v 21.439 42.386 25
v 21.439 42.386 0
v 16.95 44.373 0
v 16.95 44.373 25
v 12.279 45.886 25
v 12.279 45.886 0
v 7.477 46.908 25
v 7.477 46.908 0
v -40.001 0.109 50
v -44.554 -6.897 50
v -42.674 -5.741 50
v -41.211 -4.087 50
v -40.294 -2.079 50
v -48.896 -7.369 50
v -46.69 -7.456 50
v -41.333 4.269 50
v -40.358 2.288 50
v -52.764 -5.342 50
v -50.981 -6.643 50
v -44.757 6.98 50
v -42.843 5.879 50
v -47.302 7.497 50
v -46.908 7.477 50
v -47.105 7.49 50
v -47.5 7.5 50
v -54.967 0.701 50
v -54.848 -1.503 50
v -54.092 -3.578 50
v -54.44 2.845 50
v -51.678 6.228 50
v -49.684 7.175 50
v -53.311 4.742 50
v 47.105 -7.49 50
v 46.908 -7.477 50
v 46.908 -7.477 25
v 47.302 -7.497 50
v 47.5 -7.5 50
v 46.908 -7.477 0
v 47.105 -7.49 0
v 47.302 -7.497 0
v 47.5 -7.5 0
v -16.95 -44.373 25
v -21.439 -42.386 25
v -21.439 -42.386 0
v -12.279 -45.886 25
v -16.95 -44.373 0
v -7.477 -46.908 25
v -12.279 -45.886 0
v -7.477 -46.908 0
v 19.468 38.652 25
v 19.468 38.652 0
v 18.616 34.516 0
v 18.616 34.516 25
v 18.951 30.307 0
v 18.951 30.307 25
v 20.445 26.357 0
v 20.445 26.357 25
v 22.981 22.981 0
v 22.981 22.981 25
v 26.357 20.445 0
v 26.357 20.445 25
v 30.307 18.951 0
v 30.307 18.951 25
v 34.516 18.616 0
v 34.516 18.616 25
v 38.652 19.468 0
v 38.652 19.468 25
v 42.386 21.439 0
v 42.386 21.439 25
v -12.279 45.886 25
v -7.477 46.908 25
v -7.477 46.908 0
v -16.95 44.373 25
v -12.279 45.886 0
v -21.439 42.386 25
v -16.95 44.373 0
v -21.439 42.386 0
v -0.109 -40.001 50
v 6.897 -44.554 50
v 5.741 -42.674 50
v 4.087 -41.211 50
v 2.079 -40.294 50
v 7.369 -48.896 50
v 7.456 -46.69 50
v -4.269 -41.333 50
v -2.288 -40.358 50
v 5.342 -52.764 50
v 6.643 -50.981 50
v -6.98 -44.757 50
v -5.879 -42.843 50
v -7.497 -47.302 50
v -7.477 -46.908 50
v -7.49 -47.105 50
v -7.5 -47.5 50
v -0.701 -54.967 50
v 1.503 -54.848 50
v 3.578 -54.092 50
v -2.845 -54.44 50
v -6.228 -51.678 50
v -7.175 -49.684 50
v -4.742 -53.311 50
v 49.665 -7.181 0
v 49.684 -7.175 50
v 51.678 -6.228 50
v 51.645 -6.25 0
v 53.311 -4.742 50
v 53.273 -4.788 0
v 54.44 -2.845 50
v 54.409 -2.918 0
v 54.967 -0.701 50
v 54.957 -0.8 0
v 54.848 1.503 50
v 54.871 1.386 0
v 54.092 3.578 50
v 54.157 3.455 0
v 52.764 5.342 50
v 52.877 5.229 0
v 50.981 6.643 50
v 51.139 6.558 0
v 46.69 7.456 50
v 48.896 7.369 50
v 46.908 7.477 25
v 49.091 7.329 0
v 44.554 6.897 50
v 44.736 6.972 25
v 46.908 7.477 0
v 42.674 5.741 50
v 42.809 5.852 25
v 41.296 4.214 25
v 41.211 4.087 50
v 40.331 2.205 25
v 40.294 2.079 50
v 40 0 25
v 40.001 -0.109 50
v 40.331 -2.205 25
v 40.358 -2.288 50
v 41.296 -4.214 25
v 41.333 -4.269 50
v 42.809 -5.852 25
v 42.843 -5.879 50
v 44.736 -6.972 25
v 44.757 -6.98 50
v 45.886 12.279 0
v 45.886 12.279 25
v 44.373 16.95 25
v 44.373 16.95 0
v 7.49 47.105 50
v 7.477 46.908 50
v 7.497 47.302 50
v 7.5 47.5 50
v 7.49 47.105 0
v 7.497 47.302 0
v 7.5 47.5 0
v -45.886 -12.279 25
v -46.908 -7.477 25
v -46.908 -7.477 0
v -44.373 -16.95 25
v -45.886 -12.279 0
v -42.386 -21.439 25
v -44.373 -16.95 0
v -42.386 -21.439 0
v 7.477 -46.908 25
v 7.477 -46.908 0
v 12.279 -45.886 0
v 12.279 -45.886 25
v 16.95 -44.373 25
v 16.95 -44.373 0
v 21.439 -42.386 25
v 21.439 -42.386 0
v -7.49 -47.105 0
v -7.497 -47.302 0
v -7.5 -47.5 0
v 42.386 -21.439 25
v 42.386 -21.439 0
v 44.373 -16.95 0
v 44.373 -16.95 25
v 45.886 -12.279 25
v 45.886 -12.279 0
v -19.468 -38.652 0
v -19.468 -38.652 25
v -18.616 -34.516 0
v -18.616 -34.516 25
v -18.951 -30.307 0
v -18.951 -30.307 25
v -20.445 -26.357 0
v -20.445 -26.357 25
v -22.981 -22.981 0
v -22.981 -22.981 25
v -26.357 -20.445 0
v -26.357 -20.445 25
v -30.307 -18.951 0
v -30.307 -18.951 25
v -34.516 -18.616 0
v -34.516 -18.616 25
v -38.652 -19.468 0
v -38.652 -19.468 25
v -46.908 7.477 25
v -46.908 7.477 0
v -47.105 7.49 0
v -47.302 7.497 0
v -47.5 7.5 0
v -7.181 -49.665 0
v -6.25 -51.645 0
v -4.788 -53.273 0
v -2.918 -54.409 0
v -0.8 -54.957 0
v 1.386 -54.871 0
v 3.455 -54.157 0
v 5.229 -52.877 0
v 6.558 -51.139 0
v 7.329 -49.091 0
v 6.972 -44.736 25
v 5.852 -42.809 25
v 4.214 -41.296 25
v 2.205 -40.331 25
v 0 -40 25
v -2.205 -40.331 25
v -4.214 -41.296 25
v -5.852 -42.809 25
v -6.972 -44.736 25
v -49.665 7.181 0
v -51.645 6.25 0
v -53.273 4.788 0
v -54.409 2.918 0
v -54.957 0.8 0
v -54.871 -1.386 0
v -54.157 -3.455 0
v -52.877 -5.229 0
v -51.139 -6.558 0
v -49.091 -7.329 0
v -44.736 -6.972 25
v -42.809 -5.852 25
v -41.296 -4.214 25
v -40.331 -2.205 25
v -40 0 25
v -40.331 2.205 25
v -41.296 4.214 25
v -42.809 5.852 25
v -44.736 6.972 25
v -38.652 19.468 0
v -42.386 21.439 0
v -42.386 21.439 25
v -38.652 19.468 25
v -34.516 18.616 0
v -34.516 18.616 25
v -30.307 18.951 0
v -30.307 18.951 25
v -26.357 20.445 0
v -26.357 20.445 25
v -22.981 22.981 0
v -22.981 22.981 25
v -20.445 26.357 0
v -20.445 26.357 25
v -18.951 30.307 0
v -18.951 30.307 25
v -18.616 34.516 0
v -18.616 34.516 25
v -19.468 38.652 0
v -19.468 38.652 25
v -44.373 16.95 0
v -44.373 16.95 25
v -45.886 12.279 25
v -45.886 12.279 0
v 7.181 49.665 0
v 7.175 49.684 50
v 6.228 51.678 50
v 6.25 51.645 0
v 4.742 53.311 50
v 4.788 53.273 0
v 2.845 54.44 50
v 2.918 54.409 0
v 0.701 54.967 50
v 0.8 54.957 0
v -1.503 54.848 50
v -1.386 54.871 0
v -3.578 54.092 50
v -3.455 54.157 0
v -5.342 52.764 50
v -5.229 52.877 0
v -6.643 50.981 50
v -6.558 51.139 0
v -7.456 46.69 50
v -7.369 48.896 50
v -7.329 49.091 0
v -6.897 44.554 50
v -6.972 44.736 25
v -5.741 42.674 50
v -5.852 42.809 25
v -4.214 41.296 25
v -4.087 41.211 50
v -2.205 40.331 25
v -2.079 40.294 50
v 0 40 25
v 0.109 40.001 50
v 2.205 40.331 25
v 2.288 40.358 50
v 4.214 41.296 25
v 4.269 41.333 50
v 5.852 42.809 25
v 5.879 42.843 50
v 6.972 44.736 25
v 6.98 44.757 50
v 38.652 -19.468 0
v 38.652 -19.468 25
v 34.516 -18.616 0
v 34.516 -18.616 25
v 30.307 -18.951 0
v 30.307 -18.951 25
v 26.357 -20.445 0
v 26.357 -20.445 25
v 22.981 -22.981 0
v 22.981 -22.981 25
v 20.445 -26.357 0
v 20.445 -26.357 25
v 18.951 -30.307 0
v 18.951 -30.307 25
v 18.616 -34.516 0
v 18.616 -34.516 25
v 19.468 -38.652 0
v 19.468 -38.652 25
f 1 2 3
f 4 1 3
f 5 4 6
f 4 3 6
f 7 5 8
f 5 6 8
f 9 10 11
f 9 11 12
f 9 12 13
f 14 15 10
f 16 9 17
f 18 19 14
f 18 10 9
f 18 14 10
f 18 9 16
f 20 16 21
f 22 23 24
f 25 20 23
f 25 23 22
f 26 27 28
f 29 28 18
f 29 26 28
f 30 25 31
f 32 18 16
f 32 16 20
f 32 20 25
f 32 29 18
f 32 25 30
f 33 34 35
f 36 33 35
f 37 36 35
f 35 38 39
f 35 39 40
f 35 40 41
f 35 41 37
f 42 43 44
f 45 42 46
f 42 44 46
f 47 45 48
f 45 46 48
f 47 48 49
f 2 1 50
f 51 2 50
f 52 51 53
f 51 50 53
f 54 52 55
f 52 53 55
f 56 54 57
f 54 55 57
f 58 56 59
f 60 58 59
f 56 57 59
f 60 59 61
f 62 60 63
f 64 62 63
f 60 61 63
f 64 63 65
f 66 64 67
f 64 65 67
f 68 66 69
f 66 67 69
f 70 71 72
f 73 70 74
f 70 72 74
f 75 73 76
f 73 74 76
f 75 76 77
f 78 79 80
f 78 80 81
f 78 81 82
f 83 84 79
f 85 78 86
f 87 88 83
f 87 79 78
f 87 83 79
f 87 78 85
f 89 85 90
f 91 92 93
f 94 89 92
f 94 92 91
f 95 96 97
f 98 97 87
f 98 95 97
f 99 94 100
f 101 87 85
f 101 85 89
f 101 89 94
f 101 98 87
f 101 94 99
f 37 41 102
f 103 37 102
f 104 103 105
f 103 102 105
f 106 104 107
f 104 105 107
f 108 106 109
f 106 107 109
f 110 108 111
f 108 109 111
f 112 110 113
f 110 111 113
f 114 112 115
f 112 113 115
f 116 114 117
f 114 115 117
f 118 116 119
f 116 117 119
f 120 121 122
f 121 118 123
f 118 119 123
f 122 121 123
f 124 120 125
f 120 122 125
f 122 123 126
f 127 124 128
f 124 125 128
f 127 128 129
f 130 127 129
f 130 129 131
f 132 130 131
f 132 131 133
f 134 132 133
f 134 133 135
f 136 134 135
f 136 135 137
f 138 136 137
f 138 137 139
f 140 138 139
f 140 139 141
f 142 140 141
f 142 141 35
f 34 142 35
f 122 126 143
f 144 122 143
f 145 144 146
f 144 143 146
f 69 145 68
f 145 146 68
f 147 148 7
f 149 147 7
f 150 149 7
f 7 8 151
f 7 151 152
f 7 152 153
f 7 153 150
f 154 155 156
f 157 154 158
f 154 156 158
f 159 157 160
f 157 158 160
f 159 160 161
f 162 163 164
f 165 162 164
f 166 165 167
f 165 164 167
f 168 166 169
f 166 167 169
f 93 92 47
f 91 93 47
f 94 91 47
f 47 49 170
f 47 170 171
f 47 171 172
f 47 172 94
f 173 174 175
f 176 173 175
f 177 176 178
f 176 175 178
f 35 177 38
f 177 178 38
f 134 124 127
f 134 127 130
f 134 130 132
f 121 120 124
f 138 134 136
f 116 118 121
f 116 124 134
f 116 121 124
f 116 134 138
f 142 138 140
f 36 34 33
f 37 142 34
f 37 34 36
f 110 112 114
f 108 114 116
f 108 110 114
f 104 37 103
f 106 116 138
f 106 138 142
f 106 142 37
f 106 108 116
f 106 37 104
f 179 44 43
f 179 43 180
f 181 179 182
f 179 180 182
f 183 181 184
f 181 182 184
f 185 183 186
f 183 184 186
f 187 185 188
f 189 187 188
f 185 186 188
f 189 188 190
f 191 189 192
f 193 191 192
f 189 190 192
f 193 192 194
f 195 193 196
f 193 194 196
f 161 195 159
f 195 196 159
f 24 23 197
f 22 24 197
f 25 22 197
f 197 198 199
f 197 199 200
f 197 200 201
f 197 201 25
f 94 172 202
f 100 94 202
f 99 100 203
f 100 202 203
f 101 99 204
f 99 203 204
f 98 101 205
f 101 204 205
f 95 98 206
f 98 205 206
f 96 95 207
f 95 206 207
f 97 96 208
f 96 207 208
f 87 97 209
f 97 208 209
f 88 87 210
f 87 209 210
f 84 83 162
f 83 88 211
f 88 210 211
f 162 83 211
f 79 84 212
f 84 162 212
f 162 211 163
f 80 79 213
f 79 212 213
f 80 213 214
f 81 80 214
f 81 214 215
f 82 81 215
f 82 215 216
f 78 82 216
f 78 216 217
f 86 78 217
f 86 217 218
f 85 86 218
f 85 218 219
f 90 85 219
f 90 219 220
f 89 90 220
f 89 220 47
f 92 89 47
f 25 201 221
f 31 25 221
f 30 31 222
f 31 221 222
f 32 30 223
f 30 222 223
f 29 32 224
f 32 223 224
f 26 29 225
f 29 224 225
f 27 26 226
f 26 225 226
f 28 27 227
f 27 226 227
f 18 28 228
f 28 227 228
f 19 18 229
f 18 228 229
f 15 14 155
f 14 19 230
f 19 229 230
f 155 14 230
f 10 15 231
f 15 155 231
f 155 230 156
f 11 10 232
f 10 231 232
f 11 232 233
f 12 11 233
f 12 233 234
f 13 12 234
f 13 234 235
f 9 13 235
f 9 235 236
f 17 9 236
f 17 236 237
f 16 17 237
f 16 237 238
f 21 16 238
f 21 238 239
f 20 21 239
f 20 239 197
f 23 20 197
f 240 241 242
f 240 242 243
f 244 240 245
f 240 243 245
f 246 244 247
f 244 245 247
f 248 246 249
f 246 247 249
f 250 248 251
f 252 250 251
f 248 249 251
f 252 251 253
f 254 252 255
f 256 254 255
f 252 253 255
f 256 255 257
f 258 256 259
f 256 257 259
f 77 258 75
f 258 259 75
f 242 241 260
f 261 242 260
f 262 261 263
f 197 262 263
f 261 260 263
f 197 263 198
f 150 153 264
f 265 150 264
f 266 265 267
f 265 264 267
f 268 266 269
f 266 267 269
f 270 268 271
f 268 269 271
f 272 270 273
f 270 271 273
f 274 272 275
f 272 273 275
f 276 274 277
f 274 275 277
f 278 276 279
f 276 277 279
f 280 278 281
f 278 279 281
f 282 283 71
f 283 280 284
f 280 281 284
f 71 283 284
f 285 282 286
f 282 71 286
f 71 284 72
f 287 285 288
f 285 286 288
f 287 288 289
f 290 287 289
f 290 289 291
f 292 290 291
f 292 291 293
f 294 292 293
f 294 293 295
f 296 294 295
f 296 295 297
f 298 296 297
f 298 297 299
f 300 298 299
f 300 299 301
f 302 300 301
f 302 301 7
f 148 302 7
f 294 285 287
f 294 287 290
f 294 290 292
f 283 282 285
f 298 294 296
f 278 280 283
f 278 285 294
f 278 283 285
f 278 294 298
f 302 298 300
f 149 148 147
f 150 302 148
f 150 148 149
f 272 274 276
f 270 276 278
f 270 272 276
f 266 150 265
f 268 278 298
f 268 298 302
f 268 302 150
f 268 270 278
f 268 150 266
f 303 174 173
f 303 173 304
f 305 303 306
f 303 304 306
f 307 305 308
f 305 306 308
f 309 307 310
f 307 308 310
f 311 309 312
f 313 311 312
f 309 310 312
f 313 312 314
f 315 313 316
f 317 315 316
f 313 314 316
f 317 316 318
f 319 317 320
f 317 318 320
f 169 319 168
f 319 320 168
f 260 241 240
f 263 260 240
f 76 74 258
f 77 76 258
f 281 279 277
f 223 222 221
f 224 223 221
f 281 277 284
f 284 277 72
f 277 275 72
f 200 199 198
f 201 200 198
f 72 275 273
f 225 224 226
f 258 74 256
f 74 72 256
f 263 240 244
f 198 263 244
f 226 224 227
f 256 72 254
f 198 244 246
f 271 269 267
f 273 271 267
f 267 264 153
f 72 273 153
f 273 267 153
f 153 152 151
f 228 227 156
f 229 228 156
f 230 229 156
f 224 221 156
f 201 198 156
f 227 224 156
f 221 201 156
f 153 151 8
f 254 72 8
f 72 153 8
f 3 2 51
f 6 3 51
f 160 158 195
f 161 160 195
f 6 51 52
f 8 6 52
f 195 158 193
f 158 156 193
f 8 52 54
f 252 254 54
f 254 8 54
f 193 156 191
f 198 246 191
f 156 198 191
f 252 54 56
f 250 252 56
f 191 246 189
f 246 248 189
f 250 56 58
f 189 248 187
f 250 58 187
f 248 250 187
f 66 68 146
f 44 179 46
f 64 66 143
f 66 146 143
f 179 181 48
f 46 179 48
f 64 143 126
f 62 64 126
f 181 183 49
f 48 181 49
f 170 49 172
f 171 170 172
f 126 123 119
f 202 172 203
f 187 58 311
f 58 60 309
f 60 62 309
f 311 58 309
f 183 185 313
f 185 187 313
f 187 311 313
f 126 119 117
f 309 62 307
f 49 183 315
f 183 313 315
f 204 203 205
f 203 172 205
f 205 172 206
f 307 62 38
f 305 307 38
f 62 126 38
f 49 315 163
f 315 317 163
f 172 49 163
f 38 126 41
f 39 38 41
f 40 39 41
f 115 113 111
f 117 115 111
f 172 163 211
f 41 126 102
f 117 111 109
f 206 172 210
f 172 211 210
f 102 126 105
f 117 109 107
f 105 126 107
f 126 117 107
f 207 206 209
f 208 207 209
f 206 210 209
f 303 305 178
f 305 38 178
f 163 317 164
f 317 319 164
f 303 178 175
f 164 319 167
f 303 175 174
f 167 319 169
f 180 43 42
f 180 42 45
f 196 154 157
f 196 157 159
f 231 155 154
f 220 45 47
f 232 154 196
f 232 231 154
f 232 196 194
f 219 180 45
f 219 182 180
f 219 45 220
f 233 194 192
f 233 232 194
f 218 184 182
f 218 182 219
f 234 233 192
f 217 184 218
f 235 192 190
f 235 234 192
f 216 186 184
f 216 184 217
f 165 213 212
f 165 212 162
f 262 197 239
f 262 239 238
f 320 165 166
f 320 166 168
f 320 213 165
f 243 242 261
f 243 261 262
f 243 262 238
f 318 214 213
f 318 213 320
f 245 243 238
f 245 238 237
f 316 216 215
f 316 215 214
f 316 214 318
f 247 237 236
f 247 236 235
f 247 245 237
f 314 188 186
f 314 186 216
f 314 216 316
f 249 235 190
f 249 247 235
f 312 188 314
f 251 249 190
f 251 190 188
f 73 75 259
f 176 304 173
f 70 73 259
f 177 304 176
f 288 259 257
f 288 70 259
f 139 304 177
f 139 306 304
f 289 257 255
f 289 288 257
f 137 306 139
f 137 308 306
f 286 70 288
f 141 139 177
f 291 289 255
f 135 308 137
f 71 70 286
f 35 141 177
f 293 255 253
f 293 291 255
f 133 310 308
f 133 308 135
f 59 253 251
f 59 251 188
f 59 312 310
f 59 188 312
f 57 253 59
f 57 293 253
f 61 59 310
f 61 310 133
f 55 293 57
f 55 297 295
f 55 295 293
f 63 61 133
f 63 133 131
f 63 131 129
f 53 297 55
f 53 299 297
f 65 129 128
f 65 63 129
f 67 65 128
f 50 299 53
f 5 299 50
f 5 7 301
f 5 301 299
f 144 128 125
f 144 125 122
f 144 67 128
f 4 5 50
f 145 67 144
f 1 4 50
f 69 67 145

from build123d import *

# Parameters (mm, degrees)
F1_DEPTH        = 25
F2_DEPTH        = 50
F2_COPIES_COUNT = 4
F4_DEPTH        = 25.001
F4_COPIES_COUNT = 4


# Not quite as in the source:
# - a pattern or mirror of a feature is missing from the dataset's text; its kind, count and spacing are read off the source's solid


with BuildPart() as f1:
    # F0 (on Top) → F1 (new body)
    with BuildSketch(Plane.XY):
        with BuildLine():
            ThreePointArc((-7.4765908914, 46.9078947368), (-30.8310876605, -36.1343885194), (47.5, 0))
            ThreePointArc((47.5, 0), (36.1343885194, 30.8310876605), (7.4765908914, 46.9078947368))
            ThreePointArc((7.4765908914, 46.9078947368), (0, 40), (-7.4765908914, 46.9078947368))
        make_face()
        with BuildLine():
            ThreePointArc((-7.4765908914, 46.9078947368), (0, 40), (7.4765908914, 46.9078947368))
            ThreePointArc((7.4765908914, 46.9078947368), (0, 47.5), (-7.4765908914, 46.9078947368))
        make_face()
    extrude(amount=F1_DEPTH)

    # F0 (on Top) → F2 (join)
    with BuildSketch(Plane.XY):
        with BuildLine():
            ThreePointArc((-7.4765908914, 46.9078947368), (0, 40), (7.4765908914, 46.9078947368))
            ThreePointArc((7.4765908914, 46.9078947368), (0, 47.5), (-7.4765908914, 46.9078947368))
        make_face()
        with BuildLine():
            ThreePointArc((-7.4765908914, 46.9078947368), (0, 47.5), (7.4765908914, 46.9078947368))
            ThreePointArc((7.4765908914, 46.9078947368), (7.4941454378, 47.2037160867), (7.5, 47.5))
            ThreePointArc((7.5, 47.5), (-0.2962839133, 54.9941454378), (-7.4765908914, 46.9078947368))
        make_face()
    f2 = extrude(amount=F2_DEPTH)

    # F2_copies: F2 ×4 about axis
    f2_copies_axis = Axis((0, 0, 0), (0, 0, 1))
    for i in range(1, F2_COPIES_COUNT):
        add(f2.rotate(f2_copies_axis, i * 360 / F2_COPIES_COUNT))

    # F3 (on face) → F4 (cut, through all)
    with BuildSketch(Plane.XY.offset(25)):
        with BuildLine():
            ThreePointArc((42.3863974889, 21.4392935498), (33.5875721064, 33.5875721064), (21.4392935498, 42.3863974889))
            ThreePointArc((21.4392935498, 42.3863974889), (22.9809703886, 22.9809703886), (42.3863974889, 21.4392935498))
        make_face()
    f4 = extrude(amount=-F4_DEPTH, mode=Mode.SUBTRACT)

    # F4_copies: F4 ×4 about axis
    f4_copies_axis = Axis((0, 0, 0), (0, 0, 1))
    for i in range(1, F4_COPIES_COUNT):
        add(f4.rotate(f4_copies_axis, i * 360 / F4_COPIES_COUNT), mode=Mode.SUBTRACT)


solid = f1.part
